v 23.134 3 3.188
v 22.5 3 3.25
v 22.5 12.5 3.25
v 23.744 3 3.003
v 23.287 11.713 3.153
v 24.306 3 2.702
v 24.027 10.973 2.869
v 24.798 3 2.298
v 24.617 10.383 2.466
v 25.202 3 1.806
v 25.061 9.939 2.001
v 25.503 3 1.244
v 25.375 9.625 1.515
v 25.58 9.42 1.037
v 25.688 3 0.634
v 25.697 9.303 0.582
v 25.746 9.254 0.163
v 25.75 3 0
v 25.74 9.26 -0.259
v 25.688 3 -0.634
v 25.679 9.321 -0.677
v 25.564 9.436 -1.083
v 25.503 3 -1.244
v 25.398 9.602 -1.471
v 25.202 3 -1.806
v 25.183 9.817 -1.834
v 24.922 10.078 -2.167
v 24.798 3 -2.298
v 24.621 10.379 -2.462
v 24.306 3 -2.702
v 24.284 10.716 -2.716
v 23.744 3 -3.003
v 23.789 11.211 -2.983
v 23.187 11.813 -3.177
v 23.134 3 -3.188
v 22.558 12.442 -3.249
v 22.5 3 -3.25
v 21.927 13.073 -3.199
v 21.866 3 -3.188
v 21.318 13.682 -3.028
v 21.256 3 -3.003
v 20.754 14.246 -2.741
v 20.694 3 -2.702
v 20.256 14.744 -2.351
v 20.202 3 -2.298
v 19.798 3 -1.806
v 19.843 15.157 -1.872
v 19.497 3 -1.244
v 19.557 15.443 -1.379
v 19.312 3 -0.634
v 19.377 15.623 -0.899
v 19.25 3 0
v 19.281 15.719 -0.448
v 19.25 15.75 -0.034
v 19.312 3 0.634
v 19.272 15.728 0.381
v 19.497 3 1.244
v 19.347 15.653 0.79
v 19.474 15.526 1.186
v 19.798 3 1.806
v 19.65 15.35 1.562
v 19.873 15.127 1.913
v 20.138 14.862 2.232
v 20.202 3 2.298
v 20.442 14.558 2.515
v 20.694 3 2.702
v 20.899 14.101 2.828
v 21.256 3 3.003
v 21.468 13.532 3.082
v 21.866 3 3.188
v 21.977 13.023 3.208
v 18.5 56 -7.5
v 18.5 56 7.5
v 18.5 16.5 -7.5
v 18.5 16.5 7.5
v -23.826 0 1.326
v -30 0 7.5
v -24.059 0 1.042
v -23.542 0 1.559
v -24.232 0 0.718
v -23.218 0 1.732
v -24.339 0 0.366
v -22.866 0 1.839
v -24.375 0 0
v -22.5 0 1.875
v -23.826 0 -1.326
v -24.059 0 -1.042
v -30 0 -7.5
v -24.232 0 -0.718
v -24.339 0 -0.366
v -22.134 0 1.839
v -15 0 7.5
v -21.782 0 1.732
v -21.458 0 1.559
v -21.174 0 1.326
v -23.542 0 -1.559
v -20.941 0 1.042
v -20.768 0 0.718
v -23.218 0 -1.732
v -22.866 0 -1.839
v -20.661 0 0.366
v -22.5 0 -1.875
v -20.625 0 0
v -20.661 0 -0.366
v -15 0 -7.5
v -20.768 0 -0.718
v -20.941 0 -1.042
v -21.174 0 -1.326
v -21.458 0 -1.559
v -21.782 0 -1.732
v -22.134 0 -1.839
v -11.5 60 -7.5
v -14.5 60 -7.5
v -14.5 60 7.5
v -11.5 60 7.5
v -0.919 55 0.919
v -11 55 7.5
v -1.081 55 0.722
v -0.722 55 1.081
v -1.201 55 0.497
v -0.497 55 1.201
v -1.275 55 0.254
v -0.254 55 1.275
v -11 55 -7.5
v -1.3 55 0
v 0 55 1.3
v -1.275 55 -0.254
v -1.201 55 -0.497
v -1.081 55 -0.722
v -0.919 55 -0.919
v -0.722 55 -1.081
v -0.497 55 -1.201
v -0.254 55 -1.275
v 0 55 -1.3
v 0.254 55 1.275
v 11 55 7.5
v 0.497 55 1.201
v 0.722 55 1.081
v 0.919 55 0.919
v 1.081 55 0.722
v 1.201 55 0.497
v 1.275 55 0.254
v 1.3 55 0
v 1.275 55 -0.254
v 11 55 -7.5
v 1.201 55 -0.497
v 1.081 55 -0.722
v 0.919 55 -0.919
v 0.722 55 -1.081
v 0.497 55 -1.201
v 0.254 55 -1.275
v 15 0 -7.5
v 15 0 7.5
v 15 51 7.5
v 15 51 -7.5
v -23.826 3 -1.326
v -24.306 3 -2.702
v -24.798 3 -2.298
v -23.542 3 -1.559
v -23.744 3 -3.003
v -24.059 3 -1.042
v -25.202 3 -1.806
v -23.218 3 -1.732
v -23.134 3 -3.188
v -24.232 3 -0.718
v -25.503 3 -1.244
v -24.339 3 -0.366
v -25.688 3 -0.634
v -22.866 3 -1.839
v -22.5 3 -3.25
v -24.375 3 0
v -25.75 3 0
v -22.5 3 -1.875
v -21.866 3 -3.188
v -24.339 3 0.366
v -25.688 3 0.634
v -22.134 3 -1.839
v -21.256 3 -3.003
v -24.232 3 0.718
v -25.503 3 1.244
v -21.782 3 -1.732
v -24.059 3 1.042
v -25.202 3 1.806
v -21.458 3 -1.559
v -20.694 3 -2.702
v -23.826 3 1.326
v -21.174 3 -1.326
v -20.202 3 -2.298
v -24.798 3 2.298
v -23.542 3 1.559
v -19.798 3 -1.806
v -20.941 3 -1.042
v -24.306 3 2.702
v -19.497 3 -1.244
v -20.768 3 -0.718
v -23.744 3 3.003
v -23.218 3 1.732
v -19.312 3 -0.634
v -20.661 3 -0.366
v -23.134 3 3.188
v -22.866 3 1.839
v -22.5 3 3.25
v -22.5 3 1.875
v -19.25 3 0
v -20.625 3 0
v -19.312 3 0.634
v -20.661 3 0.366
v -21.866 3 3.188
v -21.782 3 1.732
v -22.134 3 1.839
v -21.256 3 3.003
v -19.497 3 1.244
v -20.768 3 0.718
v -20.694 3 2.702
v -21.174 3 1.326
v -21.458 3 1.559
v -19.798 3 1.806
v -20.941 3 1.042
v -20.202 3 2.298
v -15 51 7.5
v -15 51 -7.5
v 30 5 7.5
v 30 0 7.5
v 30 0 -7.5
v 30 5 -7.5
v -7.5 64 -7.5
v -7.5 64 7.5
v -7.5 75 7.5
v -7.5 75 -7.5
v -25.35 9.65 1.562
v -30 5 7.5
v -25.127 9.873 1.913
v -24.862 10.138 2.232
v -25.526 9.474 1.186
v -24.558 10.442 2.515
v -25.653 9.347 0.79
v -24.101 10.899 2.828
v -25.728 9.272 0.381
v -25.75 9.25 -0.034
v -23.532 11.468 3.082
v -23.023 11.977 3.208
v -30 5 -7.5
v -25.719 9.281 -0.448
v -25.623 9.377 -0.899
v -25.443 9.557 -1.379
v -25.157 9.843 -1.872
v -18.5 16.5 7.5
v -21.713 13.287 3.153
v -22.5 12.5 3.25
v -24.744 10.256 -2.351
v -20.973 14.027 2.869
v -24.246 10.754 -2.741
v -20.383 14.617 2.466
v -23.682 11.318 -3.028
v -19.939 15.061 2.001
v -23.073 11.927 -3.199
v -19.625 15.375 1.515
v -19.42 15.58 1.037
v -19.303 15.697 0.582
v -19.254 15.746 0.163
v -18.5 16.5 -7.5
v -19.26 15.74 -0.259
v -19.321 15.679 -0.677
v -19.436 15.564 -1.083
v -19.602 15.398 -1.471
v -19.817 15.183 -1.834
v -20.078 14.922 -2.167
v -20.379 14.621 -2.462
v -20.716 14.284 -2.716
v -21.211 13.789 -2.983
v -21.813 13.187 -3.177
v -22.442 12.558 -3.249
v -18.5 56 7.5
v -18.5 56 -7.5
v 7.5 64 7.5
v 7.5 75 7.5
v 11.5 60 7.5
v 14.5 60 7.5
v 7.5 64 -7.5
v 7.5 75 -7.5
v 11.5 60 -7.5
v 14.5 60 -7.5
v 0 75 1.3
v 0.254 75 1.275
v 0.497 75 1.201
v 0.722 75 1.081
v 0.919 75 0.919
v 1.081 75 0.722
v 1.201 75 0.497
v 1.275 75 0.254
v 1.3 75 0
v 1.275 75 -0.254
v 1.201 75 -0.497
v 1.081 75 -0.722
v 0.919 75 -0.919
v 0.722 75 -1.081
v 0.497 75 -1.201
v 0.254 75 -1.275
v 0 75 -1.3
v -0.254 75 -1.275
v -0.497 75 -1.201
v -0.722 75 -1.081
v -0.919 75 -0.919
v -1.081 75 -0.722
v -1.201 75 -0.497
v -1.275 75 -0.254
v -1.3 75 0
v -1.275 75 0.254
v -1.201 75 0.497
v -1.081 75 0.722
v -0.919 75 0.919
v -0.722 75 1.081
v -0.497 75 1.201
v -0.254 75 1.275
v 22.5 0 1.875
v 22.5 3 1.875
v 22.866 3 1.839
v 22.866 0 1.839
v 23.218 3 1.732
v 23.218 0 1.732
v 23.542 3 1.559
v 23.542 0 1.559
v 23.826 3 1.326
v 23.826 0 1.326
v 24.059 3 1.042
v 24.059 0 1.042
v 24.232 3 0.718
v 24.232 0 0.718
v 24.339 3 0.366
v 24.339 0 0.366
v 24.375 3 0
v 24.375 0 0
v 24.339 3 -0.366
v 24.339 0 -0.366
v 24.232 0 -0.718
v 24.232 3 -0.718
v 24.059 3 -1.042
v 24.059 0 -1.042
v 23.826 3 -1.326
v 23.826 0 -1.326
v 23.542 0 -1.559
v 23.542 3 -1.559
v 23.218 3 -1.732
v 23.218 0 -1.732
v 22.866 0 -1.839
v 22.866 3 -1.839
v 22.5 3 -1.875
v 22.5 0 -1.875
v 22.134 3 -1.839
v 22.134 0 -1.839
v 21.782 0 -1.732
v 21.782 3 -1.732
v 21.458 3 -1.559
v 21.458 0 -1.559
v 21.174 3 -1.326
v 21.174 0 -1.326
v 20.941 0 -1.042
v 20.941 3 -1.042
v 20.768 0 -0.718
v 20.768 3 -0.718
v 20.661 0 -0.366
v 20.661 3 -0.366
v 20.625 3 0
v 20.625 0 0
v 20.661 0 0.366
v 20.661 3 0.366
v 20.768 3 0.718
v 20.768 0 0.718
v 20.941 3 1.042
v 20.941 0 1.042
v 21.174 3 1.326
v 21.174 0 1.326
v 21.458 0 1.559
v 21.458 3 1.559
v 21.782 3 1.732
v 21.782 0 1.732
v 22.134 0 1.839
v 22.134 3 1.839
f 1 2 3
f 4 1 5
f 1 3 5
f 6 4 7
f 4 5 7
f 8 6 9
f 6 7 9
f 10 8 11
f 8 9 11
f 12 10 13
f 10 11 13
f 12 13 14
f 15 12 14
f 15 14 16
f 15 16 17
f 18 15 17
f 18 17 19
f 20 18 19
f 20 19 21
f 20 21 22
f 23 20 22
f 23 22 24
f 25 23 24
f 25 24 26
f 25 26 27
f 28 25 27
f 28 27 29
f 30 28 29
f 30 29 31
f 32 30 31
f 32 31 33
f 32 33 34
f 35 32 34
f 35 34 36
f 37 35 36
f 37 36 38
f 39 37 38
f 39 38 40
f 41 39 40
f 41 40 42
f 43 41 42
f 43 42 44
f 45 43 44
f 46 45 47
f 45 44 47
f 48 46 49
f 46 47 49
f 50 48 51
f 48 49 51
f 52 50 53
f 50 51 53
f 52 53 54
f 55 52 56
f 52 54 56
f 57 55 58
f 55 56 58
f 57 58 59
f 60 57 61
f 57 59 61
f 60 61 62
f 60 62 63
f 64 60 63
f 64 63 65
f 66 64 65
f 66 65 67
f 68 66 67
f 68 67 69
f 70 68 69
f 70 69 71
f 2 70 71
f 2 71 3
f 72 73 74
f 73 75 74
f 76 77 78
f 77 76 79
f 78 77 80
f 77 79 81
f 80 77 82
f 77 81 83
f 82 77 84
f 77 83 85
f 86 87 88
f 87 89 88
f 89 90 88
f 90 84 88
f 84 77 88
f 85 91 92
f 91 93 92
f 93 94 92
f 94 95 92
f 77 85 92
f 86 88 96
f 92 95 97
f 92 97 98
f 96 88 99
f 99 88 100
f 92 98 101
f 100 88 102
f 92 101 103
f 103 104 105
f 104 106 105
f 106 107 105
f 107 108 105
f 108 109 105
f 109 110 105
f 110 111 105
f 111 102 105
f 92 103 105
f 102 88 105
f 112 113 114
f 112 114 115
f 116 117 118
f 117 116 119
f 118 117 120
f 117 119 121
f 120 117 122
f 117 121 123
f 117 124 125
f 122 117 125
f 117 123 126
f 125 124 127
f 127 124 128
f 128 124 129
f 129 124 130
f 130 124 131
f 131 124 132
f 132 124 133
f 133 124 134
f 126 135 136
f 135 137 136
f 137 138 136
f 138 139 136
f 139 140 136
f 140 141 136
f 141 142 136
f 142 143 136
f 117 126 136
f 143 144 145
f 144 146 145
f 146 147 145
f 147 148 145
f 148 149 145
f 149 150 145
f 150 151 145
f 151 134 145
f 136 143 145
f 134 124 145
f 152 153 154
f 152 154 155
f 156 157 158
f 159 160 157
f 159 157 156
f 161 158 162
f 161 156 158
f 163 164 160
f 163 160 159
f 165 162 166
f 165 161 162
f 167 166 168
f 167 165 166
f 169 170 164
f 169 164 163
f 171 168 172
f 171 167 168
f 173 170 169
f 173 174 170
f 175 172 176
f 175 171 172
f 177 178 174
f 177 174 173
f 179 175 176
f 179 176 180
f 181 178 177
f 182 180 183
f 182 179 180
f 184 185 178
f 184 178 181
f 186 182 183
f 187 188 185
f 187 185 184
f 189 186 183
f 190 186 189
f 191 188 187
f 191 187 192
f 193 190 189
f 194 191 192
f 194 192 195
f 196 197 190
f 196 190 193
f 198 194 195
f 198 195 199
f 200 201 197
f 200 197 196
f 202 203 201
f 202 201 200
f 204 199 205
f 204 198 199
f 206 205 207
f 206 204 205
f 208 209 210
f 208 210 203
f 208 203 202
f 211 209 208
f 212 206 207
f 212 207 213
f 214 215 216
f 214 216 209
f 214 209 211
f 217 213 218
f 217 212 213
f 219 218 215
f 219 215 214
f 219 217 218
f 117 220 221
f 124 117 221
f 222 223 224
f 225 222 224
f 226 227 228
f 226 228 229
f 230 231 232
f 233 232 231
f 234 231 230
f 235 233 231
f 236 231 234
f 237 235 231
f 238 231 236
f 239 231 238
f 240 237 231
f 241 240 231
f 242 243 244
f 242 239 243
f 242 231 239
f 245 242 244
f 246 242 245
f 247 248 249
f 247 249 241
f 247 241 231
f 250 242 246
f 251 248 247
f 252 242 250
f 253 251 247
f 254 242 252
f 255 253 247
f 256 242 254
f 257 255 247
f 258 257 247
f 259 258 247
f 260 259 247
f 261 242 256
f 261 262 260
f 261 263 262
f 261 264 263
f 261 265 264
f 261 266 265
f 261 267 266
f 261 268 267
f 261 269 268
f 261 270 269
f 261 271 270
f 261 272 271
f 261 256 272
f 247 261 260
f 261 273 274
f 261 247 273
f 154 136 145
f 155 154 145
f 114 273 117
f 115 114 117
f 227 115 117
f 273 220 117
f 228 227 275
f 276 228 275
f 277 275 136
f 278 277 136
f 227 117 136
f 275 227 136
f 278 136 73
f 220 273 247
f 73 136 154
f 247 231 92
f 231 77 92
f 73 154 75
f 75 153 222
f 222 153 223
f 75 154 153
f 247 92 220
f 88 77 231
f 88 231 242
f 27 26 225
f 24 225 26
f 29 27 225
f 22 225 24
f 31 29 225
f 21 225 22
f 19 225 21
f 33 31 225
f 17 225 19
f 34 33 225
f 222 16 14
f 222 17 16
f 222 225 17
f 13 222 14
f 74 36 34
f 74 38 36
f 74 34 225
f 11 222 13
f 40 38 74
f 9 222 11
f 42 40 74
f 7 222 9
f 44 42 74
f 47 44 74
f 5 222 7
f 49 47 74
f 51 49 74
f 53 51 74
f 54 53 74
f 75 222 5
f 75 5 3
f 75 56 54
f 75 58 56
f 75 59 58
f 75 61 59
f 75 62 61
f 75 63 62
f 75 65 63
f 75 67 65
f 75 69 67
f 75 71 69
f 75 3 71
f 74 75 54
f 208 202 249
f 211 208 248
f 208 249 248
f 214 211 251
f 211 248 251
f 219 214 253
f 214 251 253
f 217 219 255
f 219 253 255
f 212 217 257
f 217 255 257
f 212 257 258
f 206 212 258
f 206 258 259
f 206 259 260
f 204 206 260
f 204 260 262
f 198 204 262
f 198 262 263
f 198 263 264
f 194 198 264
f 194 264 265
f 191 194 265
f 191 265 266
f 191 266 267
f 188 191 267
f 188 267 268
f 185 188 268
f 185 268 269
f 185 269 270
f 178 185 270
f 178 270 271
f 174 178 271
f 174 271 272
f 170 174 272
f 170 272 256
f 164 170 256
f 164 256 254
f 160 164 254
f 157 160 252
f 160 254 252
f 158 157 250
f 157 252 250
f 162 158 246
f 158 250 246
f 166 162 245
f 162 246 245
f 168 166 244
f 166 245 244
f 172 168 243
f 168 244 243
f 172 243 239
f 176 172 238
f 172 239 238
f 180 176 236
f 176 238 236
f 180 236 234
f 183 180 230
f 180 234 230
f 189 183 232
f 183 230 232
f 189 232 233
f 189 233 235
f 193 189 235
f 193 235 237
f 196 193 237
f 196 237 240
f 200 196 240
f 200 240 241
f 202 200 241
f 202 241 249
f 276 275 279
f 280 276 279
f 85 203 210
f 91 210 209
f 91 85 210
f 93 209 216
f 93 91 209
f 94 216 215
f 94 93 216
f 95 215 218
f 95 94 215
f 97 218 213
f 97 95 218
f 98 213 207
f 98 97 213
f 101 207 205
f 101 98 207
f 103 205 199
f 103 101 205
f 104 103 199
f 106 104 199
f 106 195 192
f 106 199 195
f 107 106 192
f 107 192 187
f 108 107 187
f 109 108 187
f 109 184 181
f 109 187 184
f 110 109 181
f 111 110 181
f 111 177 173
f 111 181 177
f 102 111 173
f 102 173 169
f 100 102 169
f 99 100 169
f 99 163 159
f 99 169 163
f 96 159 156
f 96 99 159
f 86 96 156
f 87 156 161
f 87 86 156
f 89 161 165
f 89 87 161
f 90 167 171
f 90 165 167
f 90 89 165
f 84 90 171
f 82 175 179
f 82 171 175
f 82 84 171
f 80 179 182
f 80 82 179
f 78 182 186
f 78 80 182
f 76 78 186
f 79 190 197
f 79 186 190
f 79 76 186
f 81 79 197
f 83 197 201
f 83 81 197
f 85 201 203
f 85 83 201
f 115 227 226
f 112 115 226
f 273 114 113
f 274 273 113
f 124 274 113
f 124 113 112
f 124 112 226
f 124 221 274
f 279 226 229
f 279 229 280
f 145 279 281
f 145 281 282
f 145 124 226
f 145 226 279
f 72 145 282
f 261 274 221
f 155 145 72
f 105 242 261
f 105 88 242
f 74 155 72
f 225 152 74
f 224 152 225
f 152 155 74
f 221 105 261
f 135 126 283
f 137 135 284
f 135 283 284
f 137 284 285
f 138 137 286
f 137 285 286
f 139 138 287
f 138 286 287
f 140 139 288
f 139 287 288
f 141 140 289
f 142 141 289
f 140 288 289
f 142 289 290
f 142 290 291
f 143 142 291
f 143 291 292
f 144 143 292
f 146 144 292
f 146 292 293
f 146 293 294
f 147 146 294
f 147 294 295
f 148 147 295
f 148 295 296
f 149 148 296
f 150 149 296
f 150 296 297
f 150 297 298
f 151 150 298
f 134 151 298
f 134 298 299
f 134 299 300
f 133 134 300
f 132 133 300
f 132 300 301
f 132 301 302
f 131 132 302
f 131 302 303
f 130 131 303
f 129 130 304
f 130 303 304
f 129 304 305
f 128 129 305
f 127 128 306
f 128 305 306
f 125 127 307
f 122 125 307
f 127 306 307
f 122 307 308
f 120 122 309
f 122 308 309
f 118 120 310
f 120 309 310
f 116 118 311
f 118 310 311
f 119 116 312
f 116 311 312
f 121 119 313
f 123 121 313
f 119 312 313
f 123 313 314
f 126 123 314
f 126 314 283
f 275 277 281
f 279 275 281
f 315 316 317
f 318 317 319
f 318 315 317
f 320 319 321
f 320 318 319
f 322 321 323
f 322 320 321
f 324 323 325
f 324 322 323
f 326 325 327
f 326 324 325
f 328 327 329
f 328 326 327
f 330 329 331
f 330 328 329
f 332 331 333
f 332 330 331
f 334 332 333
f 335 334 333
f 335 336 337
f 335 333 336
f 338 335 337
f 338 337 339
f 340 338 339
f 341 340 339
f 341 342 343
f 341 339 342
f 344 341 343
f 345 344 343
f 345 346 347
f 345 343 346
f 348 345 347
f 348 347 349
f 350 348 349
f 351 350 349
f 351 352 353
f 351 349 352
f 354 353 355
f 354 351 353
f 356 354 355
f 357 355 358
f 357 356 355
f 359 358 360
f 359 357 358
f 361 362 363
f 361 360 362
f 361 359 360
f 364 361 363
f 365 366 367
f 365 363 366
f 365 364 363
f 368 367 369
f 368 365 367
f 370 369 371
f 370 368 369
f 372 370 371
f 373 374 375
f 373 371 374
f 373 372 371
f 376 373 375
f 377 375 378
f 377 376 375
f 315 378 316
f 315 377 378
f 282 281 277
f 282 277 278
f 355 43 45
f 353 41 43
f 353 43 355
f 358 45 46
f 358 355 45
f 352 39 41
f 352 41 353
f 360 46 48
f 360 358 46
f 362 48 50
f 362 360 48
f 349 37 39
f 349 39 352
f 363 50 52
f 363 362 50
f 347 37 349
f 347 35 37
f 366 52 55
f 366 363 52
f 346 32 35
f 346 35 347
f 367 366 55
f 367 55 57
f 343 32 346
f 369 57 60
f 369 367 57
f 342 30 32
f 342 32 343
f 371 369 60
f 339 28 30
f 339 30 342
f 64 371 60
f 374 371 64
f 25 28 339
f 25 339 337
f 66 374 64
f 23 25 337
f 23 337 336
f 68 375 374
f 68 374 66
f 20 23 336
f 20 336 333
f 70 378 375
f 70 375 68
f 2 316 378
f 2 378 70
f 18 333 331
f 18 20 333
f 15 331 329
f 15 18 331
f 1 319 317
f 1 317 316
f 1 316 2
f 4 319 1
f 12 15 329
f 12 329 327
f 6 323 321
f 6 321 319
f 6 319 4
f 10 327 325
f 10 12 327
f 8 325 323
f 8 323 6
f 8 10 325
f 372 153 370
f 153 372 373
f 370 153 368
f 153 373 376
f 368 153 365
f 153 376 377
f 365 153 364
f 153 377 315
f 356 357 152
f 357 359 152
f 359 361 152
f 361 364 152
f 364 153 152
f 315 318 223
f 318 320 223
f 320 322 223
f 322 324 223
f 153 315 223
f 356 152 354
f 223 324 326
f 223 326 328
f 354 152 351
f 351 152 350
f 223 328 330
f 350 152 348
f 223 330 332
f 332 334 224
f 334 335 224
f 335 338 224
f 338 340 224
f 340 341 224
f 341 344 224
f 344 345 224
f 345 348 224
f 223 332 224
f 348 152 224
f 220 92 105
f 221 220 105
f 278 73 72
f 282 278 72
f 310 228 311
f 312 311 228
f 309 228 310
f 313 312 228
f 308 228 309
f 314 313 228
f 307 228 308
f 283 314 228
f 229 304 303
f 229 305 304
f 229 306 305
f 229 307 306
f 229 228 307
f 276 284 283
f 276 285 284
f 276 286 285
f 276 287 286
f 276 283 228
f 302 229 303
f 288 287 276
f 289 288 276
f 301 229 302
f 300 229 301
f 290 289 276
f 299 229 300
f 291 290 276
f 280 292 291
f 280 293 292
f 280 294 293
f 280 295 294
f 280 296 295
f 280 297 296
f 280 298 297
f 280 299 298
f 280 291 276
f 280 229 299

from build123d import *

# Parameters (mm, degrees)
SKETCH1_W             = 15
SKETCH1_H             = 15
SKETCH1_R             = 1.875
BOSS_EXTRUDE1_DEPTH   = 5
BOSS_EXTRUDE1_2_DEPTH = 5
SKETCH2_W             = 3.5
SKETCH2_H             = 15
BOSS_EXTRUDE2_DEPTH   = 50
SKETCH4_W             = 37
SKETCH4_H             = 15
BOSS_EXTRUDE3_DEPTH   = 5
SKETCH5_W             = 15
SKETCH5_H             = 15
BOSS_EXTRUDE4_DEPTH   = 15
SKETCH6_R             = 1.3
CUT_EXTRUDE1_DEPTH    = 82.124903698
CHAMFER1_SIZE         = 4
SKETCH7_R             = 3.25
CUT_EXTRUDE2_DEPTH    = 2
CHAMFER2_SIZE         = 11.5


with BuildPart() as part:
    # Sketch1 → Boss-Extrude1 (new body)
    with BuildSketch(Plane(origin=(0, 0, 0), x_dir=(1, 0, 0), z_dir=(0, 1, 0))):
        with Locations((-22.5, 0)):
            Rectangle(SKETCH1_W, SKETCH1_H)
        with Locations(Location((-22.5, 0, 0), (0, 0, 270))):
            Circle(SKETCH1_R, mode=Mode.SUBTRACT)
    extrude(amount=BOSS_EXTRUDE1_DEPTH)



with BuildPart() as body_2:
    # Sketch1 → Boss-Extrude1 2 (new body)
    with BuildSketch(Plane(origin=(0, 0, 0), x_dir=(1, 0, 0), z_dir=(0, 1, 0))):
        with Locations((22.5, 0)):
            Rectangle(SKETCH1_W, SKETCH1_H)
        with Locations(Location((22.5, 0, 0), (0, 0, 270))):
            Circle(SKETCH1_R, mode=Mode.SUBTRACT)
    extrude(amount=BOSS_EXTRUDE1_2_DEPTH)


with BuildPart() as part_1:
    add(part.part)

    add(body_2.part)  # Boss-Extrude2 merges body 2
    # Sketch2 → Boss-Extrude2 (add)
    with BuildSketch(Plane(origin=(0, 5, 0), x_dir=(1, 0, 0), z_dir=(0, 1, 0))):
        with Locations((-16.75, 0)):
            Rectangle(SKETCH2_W, SKETCH2_H)
        with Locations((16.75, 0)):
            Rectangle(SKETCH2_W, SKETCH2_H)
    extrude(amount=BOSS_EXTRUDE2_DEPTH)

    # Sketch4 → Boss-Extrude3 (add)
    with BuildSketch(Plane(origin=(0, 55, 0), x_dir=(1, 0, 0), z_dir=(0, 1, 0))):
        Rectangle(SKETCH4_W, SKETCH4_H)
    extrude(amount=BOSS_EXTRUDE3_DEPTH)

    # Sketch5 → Boss-Extrude4 (add)
    with BuildSketch(Plane(origin=(0, 60, 0), x_dir=(1, 0, 0), z_dir=(0, 1, 0))):
        Rectangle(SKETCH5_W, SKETCH5_H)
    extrude(amount=BOSS_EXTRUDE4_DEPTH)

    # Sketch6 → Cut-Extrude1 (cut, through all)
    with BuildSketch(Plane(origin=(0, 75, 0), x_dir=(1, 0, 0), z_dir=(0, 1, 0))):
        with Locations(Location((0, 0, 0), (0, 0, 270))):
            Circle(SKETCH6_R)
    extrude(amount=-CUT_EXTRUDE1_DEPTH, mode=Mode.SUBTRACT)

    # Chamfer1
    chamfer1_edges = [part_1.edges().sort_by_distance(p)[0] for p in [
        (-15, 55, 0),
        (-18.5, 60, 0),
        (18.5, 60, 0),
        (15, 55, 0),
        (7.5, 60, 0),
        (-7.5, 60, 0),
    ]]
    chamfer(chamfer1_edges, length=CHAMFER1_SIZE)

    # Sketch7 → Cut-Extrude2 (cut)
    with BuildSketch(Plane(origin=(0, 5, 0), x_dir=(1, 0, 0), z_dir=(0, 1, 0))):
        with Locations(Location((-22.5, 0, 0), (0, 0, 270))):
            Circle(SKETCH7_R)
        with Locations(Location((22.5, 0, 0), (0, 0, 270))):
            Circle(SKETCH7_R)
    extrude(amount=-CUT_EXTRUDE2_DEPTH, mode=Mode.SUBTRACT)

    # Chamfer2
    # the kernel refuses this chamfer: 11.5 mm, written as the material it adds along each edge
    with BuildSketch(Plane(origin=(18.5, 5, 7.5), x_dir=(0.9996219169112968, -0.02749587661058638, 0), z_dir=(0, 0, -1))) as chamfer2_piece_1_section:
        Polygon((CHAMFER2_SIZE * 0.999621916911, -CHAMFER2_SIZE * 0.0274958766106), (-CHAMFER2_SIZE * 0.0274958766106, -CHAMFER2_SIZE * 0.999621916911), (0, 0), align=None)
    chamfer2_piece_1 = extrude(amount=15, mode=Mode.PRIVATE)
    chamfer2_piece_1 = split(chamfer2_piece_1, bisect_by=Plane(origin=(30, 6.904321088, -5), z_dir=(-1, 0, 0)), keep=Keep.TOP, mode=Mode.PRIVATE)
    chamfer2_piece_1 = chamfer2_piece_1 - Plane(origin=(22.5, 6.904321088, 0), x_dir=(0, 0, 1), z_dir=(0, 1, 0)) * Cylinder(3.25, 76, mode=Mode.PRIVATE)
    add(chamfer2_piece_1)
    with BuildSketch(Plane(origin=(-18.5, 5, -7.5), x_dir=(-0.9996219169112968, -0.02749587661058638, 0), z_dir=(0, 0, 1))) as chamfer2_piece_2_section:
        Polygon((CHAMFER2_SIZE * 0.999621916911, -CHAMFER2_SIZE * 0.0274958766106), (-CHAMFER2_SIZE * 0.0274958766106, -CHAMFER2_SIZE * 0.999621916911), (0, 0), align=None)
    chamfer2_piece_2 = extrude(amount=15, mode=Mode.PRIVATE)
    chamfer2_piece_2 = split(chamfer2_piece_2, bisect_by=Plane(origin=(-30, 6.90432124, 5), z_dir=(1, 0, 0)), keep=Keep.TOP, mode=Mode.PRIVATE)
    chamfer2_piece_2 = chamfer2_piece_2 - Plane(origin=(-22.5, 6.90432124, 0), x_dir=(0, 0, 1), z_dir=(0, 1, 0)) * Cylinder(3.25, 76, mode=Mode.PRIVATE)
    add(chamfer2_piece_2)


solid = part_1.part
